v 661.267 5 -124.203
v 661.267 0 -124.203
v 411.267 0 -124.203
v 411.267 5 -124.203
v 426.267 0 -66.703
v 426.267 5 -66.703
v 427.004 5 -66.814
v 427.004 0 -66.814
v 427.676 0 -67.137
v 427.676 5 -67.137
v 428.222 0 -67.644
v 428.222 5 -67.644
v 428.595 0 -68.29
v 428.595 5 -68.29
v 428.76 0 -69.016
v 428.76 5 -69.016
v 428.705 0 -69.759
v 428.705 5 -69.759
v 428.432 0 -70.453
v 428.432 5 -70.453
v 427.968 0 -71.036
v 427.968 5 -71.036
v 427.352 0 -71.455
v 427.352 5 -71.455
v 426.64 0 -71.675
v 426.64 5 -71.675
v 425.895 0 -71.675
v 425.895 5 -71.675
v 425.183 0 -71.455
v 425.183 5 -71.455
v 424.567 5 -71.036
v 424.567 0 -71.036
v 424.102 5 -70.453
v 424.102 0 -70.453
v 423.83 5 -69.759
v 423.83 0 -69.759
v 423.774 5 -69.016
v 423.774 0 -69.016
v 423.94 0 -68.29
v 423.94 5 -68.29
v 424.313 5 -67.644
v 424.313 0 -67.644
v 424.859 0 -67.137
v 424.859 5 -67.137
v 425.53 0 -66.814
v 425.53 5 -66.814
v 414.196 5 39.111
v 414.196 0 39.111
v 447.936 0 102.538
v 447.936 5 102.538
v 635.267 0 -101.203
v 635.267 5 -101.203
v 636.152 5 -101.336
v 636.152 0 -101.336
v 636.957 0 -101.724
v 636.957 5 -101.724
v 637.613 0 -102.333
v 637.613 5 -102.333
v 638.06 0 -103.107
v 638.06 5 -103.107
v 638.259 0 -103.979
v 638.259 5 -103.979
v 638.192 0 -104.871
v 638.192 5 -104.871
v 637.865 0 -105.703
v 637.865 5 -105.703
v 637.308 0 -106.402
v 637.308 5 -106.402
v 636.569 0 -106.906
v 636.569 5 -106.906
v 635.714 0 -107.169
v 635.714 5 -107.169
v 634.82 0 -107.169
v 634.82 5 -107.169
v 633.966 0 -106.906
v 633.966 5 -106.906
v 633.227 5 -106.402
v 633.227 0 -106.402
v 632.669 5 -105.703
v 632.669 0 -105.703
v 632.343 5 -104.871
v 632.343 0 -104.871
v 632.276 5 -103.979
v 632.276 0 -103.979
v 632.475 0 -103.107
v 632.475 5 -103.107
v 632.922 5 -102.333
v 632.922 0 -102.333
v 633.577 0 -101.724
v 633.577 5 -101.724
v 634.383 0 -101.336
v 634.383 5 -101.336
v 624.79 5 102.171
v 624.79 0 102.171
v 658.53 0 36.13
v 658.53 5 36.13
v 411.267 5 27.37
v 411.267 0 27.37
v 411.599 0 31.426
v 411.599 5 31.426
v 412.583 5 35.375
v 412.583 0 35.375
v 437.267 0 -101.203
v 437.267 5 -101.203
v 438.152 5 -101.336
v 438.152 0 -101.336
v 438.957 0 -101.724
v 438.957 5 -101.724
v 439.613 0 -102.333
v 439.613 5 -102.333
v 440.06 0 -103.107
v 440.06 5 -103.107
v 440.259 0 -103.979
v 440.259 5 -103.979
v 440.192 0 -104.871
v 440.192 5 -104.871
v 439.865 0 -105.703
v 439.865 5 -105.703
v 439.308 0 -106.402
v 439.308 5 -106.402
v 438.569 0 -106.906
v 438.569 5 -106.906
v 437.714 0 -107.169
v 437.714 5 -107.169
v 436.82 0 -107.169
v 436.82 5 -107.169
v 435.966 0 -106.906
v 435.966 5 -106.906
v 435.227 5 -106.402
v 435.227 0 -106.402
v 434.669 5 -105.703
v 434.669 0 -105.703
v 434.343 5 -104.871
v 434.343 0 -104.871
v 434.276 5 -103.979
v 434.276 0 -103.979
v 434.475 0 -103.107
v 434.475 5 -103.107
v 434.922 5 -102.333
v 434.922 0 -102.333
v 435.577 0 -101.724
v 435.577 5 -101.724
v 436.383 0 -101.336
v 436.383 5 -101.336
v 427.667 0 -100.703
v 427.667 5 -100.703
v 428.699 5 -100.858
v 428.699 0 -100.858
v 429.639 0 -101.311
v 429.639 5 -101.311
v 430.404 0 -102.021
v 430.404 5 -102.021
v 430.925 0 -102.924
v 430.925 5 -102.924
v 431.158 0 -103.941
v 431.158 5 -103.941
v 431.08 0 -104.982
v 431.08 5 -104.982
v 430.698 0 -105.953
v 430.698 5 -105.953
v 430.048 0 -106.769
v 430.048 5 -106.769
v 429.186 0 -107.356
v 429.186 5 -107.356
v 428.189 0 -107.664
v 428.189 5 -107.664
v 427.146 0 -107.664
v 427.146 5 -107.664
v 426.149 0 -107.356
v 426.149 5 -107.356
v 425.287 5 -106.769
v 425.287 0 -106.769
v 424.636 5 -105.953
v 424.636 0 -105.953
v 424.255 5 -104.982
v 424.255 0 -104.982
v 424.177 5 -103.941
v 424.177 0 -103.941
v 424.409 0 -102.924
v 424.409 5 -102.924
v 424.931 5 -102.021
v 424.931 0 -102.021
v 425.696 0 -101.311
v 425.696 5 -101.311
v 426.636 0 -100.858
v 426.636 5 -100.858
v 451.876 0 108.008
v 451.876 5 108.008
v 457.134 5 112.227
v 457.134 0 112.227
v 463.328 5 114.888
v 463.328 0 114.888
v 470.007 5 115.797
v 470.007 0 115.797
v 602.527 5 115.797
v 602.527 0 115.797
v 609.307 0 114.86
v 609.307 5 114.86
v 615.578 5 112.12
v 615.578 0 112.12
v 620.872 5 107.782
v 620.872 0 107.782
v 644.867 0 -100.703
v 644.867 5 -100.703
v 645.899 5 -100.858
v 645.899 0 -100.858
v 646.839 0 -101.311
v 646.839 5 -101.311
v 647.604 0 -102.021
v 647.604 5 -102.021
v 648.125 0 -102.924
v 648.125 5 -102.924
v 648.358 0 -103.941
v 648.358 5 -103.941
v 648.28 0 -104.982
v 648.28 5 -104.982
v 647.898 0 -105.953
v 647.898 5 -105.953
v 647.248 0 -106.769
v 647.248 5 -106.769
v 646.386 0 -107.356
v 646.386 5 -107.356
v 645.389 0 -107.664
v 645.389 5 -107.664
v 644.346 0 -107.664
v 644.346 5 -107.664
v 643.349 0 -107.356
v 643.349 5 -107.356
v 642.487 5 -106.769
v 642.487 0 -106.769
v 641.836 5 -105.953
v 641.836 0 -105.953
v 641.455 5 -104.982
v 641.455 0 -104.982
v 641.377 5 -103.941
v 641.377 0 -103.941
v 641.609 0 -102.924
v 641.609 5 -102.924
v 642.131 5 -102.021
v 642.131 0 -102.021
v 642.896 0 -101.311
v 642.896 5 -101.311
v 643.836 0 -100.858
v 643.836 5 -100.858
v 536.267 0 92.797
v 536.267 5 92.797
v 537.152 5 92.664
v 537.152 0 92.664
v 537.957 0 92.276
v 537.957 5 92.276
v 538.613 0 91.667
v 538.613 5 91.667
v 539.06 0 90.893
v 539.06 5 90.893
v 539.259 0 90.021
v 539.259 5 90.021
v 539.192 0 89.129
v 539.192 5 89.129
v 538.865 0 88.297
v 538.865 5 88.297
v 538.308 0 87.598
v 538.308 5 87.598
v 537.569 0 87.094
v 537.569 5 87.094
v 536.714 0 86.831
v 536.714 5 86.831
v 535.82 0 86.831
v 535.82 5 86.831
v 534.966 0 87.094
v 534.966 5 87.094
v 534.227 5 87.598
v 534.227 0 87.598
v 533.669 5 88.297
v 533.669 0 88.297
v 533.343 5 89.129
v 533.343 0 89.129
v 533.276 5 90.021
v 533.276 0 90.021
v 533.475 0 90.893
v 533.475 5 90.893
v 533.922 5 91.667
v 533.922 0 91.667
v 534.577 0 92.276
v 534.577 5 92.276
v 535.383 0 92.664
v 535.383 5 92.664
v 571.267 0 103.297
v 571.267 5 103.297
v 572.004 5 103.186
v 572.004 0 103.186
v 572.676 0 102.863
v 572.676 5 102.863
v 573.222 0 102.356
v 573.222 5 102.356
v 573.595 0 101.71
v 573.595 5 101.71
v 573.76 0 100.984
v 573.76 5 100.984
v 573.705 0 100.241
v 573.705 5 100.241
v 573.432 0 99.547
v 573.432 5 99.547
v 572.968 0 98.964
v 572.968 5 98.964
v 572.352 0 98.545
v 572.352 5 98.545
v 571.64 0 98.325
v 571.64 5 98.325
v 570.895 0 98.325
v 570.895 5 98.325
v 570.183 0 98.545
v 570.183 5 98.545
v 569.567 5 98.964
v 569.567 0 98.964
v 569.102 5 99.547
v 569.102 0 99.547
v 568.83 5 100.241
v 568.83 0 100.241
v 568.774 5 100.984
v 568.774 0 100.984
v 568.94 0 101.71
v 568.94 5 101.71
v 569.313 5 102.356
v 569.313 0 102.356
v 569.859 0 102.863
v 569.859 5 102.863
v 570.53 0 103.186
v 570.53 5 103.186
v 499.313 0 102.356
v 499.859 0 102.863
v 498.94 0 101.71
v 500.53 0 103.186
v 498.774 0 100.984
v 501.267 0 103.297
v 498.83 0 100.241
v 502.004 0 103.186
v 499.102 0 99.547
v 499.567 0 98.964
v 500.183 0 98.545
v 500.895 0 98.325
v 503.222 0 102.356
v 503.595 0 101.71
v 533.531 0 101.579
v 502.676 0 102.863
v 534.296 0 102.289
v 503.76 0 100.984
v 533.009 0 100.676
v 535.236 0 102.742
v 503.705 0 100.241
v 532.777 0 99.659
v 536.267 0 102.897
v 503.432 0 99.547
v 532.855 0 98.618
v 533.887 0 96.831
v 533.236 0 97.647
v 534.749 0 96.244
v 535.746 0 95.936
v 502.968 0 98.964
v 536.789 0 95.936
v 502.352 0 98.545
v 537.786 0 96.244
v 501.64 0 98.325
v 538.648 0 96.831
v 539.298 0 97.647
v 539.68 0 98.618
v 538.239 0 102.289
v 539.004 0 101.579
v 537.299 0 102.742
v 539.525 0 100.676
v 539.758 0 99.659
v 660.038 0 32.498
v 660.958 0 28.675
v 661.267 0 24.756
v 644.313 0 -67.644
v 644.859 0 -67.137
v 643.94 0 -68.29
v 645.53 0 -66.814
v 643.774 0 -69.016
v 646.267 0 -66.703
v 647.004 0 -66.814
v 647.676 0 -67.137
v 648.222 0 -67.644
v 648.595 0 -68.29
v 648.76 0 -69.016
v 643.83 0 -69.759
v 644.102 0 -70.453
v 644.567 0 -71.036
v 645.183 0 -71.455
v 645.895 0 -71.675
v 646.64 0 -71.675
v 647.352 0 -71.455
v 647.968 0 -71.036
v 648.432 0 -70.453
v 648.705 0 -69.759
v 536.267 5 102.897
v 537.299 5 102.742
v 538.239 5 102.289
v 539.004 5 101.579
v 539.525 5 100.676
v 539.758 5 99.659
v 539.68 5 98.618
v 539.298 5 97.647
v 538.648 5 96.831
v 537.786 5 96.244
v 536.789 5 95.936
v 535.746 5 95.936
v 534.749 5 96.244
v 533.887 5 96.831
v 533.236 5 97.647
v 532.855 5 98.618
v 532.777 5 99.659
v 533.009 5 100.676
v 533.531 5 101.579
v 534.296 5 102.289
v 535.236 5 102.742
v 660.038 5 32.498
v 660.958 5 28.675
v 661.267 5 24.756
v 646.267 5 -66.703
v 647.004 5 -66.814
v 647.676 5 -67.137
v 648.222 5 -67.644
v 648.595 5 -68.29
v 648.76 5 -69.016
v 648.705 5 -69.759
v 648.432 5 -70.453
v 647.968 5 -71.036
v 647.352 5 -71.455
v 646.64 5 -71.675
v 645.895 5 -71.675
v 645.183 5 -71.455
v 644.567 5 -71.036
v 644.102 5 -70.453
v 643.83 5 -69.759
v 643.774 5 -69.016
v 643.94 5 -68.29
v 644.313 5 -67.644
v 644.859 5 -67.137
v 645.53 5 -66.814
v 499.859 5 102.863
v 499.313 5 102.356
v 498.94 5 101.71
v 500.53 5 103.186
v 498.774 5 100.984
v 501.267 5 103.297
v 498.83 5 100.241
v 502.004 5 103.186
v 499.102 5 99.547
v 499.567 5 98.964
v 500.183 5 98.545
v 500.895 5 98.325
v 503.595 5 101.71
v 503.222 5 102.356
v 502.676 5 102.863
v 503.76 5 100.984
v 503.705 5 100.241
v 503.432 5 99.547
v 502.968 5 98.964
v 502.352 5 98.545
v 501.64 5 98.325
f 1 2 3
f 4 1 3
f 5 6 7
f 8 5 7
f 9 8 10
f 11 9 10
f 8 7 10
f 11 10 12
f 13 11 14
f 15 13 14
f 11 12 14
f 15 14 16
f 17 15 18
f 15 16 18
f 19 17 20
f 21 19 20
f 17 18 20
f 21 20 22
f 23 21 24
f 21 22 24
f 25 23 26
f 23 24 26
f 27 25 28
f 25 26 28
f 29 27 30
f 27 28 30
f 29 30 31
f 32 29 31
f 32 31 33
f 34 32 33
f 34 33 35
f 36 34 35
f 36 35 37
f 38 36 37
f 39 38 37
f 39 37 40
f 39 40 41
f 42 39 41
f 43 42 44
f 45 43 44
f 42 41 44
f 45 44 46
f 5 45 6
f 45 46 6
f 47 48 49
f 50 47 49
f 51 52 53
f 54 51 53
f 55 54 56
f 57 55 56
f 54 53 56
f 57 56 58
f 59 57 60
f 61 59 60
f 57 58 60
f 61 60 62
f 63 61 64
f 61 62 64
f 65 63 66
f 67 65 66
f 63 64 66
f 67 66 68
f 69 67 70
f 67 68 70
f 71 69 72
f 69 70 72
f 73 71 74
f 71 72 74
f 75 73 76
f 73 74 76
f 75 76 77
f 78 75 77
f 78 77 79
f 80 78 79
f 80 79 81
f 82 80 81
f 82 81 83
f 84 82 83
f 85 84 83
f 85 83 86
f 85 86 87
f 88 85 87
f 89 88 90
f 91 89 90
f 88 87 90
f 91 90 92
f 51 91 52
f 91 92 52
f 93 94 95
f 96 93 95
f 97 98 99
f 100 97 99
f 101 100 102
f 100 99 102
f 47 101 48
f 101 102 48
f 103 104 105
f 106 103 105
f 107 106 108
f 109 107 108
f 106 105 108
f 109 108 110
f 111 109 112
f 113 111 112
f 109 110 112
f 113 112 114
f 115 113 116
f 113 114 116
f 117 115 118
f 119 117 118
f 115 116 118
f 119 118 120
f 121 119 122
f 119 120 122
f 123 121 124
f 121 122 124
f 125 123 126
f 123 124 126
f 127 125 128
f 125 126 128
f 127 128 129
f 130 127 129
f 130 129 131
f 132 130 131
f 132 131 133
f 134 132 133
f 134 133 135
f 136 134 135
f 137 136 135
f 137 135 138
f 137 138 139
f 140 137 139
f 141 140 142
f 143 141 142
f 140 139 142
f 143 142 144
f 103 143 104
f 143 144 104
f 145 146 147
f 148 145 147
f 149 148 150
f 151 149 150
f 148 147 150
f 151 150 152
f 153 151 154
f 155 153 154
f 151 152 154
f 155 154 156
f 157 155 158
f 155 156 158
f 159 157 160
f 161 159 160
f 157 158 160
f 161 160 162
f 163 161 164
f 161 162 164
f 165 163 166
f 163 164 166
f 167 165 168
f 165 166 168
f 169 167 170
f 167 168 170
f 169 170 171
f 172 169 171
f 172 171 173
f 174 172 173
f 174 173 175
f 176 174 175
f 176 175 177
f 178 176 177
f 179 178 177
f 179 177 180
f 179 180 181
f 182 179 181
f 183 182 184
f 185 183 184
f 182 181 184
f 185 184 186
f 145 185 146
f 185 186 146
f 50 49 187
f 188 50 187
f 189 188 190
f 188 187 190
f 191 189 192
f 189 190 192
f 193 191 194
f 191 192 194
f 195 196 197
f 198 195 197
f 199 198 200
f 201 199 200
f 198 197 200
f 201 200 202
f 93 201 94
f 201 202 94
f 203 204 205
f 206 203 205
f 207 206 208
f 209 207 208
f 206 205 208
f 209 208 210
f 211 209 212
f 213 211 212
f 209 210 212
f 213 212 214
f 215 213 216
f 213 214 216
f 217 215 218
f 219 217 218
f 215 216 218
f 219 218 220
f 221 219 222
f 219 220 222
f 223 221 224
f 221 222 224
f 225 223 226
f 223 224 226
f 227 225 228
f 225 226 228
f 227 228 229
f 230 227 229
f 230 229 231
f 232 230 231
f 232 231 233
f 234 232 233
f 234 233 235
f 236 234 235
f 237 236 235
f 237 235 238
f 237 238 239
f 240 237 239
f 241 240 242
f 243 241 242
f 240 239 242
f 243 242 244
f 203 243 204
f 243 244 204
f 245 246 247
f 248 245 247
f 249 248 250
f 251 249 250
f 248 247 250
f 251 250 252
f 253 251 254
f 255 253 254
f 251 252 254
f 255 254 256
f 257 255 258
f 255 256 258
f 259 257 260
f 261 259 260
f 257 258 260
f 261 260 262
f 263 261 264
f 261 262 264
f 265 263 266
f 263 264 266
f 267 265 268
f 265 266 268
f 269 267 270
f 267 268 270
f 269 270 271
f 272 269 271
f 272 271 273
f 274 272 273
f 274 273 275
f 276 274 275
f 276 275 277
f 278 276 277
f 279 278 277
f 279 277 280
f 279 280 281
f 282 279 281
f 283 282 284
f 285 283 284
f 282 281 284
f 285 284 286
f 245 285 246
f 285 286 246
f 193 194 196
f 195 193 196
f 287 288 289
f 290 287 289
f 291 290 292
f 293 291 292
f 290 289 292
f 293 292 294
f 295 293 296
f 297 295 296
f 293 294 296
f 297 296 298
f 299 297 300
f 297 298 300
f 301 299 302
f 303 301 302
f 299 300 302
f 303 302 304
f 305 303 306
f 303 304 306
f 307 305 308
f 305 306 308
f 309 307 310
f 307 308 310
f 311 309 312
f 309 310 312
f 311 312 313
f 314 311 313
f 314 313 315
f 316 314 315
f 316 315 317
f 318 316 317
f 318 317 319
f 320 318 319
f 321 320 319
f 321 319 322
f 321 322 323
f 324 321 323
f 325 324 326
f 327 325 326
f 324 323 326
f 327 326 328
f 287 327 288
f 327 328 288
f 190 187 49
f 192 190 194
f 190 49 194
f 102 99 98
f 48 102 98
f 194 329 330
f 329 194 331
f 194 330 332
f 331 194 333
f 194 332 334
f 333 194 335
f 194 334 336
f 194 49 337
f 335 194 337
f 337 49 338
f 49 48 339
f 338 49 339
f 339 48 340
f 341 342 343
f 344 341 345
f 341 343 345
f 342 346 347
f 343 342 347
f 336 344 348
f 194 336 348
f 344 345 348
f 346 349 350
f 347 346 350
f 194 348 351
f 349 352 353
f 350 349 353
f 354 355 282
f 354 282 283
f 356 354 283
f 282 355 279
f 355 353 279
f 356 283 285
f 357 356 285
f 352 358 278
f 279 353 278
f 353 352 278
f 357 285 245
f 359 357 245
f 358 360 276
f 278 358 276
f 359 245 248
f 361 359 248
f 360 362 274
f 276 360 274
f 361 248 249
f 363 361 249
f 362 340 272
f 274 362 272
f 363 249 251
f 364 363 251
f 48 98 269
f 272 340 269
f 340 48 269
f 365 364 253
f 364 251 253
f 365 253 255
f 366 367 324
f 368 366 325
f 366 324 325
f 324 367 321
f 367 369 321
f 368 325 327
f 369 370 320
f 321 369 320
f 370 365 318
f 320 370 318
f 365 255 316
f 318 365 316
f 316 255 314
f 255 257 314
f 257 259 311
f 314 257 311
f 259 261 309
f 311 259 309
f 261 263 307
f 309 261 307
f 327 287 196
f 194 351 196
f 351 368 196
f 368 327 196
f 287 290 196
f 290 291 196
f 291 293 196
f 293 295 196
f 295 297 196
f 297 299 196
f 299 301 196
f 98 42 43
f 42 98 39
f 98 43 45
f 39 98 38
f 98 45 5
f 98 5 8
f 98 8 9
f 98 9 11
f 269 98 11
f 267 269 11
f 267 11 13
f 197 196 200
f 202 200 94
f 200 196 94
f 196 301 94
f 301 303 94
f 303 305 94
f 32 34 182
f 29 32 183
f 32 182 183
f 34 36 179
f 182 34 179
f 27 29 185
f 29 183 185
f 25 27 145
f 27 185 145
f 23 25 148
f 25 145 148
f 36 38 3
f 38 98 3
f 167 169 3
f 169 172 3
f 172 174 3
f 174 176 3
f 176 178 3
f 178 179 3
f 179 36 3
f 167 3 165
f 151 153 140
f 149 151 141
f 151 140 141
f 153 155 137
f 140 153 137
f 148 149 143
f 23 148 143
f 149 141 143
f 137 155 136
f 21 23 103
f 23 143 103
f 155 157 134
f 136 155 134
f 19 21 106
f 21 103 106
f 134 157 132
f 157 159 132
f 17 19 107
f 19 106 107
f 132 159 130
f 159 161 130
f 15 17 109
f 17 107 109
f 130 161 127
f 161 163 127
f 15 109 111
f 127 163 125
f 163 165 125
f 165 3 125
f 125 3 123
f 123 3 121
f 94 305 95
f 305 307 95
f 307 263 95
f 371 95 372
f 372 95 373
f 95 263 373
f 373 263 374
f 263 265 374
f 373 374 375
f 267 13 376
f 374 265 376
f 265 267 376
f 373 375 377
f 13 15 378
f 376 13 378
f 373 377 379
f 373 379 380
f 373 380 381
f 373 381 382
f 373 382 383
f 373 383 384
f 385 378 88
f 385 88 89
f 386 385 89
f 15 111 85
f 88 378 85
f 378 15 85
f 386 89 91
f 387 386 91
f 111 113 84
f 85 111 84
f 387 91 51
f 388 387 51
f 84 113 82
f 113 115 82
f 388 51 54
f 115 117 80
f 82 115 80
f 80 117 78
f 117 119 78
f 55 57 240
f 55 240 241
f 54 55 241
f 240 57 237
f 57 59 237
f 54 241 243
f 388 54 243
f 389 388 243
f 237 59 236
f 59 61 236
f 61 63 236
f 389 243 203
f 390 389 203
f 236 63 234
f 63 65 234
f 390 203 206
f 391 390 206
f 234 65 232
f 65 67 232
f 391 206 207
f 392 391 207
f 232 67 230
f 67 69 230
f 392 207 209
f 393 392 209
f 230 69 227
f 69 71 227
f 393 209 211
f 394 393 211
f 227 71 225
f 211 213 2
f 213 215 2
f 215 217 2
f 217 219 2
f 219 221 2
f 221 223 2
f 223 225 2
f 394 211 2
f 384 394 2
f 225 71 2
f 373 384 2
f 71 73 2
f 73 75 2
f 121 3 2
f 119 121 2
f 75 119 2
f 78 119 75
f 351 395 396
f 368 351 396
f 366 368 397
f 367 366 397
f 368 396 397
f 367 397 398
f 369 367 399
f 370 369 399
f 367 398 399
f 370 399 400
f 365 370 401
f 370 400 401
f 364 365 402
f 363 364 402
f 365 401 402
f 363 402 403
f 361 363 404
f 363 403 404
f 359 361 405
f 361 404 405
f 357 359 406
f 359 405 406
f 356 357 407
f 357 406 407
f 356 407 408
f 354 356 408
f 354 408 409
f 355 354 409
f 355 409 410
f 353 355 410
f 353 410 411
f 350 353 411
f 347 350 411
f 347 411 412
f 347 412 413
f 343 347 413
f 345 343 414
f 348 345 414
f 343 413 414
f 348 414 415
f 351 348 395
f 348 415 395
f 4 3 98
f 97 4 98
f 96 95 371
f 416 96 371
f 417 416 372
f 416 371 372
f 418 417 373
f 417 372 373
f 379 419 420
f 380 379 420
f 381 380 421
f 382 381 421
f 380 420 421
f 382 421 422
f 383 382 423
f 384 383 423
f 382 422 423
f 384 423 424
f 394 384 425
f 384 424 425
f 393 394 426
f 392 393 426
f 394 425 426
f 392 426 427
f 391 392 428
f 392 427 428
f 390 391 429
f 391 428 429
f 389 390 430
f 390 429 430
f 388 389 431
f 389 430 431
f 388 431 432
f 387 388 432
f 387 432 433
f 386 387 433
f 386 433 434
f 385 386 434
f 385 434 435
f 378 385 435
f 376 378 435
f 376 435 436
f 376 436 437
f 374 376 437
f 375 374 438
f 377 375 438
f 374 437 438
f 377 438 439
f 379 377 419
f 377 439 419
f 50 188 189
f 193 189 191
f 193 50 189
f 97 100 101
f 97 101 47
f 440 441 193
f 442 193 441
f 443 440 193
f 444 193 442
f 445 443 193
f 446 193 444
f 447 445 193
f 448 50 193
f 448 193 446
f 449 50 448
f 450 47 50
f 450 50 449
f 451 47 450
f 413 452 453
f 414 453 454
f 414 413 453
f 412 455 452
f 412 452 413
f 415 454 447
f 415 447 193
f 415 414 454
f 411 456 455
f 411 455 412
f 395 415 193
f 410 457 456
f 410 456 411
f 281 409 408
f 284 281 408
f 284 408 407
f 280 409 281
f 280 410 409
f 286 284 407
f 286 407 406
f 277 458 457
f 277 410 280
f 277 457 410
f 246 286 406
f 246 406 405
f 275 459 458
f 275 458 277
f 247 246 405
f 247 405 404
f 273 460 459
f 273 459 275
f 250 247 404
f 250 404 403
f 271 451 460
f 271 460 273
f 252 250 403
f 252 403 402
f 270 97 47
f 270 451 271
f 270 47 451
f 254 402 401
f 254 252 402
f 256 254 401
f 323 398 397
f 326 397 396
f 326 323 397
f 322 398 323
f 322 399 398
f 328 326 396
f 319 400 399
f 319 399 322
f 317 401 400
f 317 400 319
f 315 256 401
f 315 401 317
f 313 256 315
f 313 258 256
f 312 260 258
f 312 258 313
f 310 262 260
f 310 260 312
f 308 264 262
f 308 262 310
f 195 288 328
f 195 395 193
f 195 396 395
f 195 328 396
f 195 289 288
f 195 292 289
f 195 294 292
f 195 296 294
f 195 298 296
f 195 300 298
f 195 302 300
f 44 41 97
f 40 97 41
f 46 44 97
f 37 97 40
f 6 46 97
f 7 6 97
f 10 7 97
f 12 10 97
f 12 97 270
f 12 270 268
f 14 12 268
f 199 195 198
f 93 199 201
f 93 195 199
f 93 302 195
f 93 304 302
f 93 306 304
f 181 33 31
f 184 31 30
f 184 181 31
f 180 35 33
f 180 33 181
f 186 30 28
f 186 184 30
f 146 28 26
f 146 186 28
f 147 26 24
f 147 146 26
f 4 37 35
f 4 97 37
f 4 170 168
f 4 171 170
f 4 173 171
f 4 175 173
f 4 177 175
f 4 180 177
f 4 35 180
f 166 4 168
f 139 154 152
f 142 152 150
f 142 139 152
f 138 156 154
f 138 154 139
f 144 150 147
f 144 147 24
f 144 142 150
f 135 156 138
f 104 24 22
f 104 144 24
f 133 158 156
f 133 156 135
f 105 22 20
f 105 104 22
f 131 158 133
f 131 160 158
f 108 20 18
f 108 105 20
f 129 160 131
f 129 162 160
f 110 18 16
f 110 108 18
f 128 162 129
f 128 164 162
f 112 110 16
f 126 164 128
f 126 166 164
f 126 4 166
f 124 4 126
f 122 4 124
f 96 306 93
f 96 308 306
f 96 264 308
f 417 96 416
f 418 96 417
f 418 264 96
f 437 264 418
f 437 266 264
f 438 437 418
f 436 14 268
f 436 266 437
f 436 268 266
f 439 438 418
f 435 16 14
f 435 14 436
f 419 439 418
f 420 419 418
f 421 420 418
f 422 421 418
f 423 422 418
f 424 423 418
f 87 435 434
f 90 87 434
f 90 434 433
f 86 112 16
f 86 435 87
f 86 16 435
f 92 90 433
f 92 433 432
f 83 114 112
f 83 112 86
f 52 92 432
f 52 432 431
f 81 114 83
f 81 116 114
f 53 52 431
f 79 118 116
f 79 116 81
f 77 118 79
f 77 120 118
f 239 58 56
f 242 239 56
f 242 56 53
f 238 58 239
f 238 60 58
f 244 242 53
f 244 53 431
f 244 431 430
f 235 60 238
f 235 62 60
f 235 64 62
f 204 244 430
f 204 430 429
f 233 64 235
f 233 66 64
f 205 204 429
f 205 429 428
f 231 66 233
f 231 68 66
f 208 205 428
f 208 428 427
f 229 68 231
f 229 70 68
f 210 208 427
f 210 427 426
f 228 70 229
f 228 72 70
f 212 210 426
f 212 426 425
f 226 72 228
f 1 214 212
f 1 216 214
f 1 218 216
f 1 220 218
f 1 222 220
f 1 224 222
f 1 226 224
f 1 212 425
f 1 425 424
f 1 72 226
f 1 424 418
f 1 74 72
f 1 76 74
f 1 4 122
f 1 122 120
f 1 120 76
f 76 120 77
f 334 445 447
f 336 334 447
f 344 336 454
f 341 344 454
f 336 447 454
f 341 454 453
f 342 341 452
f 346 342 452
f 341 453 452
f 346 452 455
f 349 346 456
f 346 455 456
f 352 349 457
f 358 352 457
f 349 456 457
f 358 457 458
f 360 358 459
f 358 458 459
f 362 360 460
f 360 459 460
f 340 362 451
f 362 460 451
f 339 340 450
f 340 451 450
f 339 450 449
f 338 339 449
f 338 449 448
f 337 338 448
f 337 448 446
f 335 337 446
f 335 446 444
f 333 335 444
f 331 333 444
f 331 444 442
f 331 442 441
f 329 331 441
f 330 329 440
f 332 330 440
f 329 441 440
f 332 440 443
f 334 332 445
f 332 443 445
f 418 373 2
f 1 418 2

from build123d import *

# Parameters (mm, degrees)
RESSALTO_EXTRUS_O4_DEPTH = 5
ESBO_O2_R                = 2.5
ESBO_O2_R_2              = 3.5
ESBO_O2_R_3              = 3
CORTE_EXTRUS_O1_DEPTH    = 5


with BuildPart() as part:
    # Esboço1 → Ressalto-extrusão4 (new body)
    with BuildSketch(Plane(origin=(0, 0, 0), x_dir=(1, 0, 0), z_dir=(0, 1, 0))):
        with BuildLine():
            Line((470.007423898, -115.796995794), (602.527286899, -115.796995794))
            ThreePointArc((602.527286899, -115.796995794), (615.578185817, -112.120082753), (624.7901231, -102.17091879))
            Line((624.7901231, -102.17091879), (658.530191599, -36.129534592))
            ThreePointArc((658.530191599, -36.129534592), (660.573433908, -30.604931856), (661.267355398, -24.755611597))
            Line((661.267355398, -24.755611597), (661.267355398, 84.203004206))
            Line((661.267355398, 84.203004206), (661.267355398, 124.203004206))
            Line((661.267355398, 124.203004206), (411.267355398, 124.203004206))
            Line((411.267355398, 124.203004206), (411.267355398, 81.588187759))
            Line((411.267355398, 81.588187759), (411.267355398, -27.370428044))
            ThreePointArc((411.267355398, -27.370428044), (412.010540804, -33.420795447), (414.195911055, -39.11143927))
            Line((414.195911055, -39.11143927), (447.935979555, -102.53800702))
            ThreePointArc((447.935979555, -102.53800702), (457.133521627, -112.227409704), (470.007423898, -115.796995794))
        make_face()
    extrude(amount=RESSALTO_EXTRUS_O4_DEPTH)

    # Esboço2 → Corte-extrusão1 (cut)
    with BuildSketch(Plane(origin=(0, 5, 0), x_dir=(1, 0, 0), z_dir=(0, 1, 0))):
        with Locations(Location((571.267355398, -100.796995794, 0), (0, 0, 270))):
            Circle(ESBO_O2_R)
        with Locations(Location((501.267355398, -100.796995794, 0), (0, 0, 270))):
            Circle(ESBO_O2_R)
        with Locations(Location((646.267355398, 69.203004206, 0), (0, 0, 270))):
            Circle(ESBO_O2_R)
        with Locations(Location((426.267355398, 69.203004206, 0), (0, 0, 270))):
            Circle(ESBO_O2_R)
        with Locations(Location((536.267355398, -99.396995794, 0), (0, 0, 270))):
            Circle(ESBO_O2_R_2)
        with Locations(Location((536.267355398, -89.796995794, 0), (0, 0, 270))):
            Circle(ESBO_O2_R_3)
        with Locations(Location((644.867355398, 104.203004206, 0), (0, 0, 270))):
            Circle(ESBO_O2_R_2)
        with Locations(Location((635.267355398, 104.203004206, 0), (0, 0, 270))):
            Circle(ESBO_O2_R_3)
        with Locations(Location((427.667355398, 104.203004206, 0), (0, 0, 270))):
            Circle(ESBO_O2_R_2)
        with Locations(Location((437.267355398, 104.203004206, 0), (0, 0, 270))):
            Circle(ESBO_O2_R_3)
    extrude(amount=-CORTE_EXTRUS_O1_DEPTH, mode=Mode.SUBTRACT)


solid = part.part
